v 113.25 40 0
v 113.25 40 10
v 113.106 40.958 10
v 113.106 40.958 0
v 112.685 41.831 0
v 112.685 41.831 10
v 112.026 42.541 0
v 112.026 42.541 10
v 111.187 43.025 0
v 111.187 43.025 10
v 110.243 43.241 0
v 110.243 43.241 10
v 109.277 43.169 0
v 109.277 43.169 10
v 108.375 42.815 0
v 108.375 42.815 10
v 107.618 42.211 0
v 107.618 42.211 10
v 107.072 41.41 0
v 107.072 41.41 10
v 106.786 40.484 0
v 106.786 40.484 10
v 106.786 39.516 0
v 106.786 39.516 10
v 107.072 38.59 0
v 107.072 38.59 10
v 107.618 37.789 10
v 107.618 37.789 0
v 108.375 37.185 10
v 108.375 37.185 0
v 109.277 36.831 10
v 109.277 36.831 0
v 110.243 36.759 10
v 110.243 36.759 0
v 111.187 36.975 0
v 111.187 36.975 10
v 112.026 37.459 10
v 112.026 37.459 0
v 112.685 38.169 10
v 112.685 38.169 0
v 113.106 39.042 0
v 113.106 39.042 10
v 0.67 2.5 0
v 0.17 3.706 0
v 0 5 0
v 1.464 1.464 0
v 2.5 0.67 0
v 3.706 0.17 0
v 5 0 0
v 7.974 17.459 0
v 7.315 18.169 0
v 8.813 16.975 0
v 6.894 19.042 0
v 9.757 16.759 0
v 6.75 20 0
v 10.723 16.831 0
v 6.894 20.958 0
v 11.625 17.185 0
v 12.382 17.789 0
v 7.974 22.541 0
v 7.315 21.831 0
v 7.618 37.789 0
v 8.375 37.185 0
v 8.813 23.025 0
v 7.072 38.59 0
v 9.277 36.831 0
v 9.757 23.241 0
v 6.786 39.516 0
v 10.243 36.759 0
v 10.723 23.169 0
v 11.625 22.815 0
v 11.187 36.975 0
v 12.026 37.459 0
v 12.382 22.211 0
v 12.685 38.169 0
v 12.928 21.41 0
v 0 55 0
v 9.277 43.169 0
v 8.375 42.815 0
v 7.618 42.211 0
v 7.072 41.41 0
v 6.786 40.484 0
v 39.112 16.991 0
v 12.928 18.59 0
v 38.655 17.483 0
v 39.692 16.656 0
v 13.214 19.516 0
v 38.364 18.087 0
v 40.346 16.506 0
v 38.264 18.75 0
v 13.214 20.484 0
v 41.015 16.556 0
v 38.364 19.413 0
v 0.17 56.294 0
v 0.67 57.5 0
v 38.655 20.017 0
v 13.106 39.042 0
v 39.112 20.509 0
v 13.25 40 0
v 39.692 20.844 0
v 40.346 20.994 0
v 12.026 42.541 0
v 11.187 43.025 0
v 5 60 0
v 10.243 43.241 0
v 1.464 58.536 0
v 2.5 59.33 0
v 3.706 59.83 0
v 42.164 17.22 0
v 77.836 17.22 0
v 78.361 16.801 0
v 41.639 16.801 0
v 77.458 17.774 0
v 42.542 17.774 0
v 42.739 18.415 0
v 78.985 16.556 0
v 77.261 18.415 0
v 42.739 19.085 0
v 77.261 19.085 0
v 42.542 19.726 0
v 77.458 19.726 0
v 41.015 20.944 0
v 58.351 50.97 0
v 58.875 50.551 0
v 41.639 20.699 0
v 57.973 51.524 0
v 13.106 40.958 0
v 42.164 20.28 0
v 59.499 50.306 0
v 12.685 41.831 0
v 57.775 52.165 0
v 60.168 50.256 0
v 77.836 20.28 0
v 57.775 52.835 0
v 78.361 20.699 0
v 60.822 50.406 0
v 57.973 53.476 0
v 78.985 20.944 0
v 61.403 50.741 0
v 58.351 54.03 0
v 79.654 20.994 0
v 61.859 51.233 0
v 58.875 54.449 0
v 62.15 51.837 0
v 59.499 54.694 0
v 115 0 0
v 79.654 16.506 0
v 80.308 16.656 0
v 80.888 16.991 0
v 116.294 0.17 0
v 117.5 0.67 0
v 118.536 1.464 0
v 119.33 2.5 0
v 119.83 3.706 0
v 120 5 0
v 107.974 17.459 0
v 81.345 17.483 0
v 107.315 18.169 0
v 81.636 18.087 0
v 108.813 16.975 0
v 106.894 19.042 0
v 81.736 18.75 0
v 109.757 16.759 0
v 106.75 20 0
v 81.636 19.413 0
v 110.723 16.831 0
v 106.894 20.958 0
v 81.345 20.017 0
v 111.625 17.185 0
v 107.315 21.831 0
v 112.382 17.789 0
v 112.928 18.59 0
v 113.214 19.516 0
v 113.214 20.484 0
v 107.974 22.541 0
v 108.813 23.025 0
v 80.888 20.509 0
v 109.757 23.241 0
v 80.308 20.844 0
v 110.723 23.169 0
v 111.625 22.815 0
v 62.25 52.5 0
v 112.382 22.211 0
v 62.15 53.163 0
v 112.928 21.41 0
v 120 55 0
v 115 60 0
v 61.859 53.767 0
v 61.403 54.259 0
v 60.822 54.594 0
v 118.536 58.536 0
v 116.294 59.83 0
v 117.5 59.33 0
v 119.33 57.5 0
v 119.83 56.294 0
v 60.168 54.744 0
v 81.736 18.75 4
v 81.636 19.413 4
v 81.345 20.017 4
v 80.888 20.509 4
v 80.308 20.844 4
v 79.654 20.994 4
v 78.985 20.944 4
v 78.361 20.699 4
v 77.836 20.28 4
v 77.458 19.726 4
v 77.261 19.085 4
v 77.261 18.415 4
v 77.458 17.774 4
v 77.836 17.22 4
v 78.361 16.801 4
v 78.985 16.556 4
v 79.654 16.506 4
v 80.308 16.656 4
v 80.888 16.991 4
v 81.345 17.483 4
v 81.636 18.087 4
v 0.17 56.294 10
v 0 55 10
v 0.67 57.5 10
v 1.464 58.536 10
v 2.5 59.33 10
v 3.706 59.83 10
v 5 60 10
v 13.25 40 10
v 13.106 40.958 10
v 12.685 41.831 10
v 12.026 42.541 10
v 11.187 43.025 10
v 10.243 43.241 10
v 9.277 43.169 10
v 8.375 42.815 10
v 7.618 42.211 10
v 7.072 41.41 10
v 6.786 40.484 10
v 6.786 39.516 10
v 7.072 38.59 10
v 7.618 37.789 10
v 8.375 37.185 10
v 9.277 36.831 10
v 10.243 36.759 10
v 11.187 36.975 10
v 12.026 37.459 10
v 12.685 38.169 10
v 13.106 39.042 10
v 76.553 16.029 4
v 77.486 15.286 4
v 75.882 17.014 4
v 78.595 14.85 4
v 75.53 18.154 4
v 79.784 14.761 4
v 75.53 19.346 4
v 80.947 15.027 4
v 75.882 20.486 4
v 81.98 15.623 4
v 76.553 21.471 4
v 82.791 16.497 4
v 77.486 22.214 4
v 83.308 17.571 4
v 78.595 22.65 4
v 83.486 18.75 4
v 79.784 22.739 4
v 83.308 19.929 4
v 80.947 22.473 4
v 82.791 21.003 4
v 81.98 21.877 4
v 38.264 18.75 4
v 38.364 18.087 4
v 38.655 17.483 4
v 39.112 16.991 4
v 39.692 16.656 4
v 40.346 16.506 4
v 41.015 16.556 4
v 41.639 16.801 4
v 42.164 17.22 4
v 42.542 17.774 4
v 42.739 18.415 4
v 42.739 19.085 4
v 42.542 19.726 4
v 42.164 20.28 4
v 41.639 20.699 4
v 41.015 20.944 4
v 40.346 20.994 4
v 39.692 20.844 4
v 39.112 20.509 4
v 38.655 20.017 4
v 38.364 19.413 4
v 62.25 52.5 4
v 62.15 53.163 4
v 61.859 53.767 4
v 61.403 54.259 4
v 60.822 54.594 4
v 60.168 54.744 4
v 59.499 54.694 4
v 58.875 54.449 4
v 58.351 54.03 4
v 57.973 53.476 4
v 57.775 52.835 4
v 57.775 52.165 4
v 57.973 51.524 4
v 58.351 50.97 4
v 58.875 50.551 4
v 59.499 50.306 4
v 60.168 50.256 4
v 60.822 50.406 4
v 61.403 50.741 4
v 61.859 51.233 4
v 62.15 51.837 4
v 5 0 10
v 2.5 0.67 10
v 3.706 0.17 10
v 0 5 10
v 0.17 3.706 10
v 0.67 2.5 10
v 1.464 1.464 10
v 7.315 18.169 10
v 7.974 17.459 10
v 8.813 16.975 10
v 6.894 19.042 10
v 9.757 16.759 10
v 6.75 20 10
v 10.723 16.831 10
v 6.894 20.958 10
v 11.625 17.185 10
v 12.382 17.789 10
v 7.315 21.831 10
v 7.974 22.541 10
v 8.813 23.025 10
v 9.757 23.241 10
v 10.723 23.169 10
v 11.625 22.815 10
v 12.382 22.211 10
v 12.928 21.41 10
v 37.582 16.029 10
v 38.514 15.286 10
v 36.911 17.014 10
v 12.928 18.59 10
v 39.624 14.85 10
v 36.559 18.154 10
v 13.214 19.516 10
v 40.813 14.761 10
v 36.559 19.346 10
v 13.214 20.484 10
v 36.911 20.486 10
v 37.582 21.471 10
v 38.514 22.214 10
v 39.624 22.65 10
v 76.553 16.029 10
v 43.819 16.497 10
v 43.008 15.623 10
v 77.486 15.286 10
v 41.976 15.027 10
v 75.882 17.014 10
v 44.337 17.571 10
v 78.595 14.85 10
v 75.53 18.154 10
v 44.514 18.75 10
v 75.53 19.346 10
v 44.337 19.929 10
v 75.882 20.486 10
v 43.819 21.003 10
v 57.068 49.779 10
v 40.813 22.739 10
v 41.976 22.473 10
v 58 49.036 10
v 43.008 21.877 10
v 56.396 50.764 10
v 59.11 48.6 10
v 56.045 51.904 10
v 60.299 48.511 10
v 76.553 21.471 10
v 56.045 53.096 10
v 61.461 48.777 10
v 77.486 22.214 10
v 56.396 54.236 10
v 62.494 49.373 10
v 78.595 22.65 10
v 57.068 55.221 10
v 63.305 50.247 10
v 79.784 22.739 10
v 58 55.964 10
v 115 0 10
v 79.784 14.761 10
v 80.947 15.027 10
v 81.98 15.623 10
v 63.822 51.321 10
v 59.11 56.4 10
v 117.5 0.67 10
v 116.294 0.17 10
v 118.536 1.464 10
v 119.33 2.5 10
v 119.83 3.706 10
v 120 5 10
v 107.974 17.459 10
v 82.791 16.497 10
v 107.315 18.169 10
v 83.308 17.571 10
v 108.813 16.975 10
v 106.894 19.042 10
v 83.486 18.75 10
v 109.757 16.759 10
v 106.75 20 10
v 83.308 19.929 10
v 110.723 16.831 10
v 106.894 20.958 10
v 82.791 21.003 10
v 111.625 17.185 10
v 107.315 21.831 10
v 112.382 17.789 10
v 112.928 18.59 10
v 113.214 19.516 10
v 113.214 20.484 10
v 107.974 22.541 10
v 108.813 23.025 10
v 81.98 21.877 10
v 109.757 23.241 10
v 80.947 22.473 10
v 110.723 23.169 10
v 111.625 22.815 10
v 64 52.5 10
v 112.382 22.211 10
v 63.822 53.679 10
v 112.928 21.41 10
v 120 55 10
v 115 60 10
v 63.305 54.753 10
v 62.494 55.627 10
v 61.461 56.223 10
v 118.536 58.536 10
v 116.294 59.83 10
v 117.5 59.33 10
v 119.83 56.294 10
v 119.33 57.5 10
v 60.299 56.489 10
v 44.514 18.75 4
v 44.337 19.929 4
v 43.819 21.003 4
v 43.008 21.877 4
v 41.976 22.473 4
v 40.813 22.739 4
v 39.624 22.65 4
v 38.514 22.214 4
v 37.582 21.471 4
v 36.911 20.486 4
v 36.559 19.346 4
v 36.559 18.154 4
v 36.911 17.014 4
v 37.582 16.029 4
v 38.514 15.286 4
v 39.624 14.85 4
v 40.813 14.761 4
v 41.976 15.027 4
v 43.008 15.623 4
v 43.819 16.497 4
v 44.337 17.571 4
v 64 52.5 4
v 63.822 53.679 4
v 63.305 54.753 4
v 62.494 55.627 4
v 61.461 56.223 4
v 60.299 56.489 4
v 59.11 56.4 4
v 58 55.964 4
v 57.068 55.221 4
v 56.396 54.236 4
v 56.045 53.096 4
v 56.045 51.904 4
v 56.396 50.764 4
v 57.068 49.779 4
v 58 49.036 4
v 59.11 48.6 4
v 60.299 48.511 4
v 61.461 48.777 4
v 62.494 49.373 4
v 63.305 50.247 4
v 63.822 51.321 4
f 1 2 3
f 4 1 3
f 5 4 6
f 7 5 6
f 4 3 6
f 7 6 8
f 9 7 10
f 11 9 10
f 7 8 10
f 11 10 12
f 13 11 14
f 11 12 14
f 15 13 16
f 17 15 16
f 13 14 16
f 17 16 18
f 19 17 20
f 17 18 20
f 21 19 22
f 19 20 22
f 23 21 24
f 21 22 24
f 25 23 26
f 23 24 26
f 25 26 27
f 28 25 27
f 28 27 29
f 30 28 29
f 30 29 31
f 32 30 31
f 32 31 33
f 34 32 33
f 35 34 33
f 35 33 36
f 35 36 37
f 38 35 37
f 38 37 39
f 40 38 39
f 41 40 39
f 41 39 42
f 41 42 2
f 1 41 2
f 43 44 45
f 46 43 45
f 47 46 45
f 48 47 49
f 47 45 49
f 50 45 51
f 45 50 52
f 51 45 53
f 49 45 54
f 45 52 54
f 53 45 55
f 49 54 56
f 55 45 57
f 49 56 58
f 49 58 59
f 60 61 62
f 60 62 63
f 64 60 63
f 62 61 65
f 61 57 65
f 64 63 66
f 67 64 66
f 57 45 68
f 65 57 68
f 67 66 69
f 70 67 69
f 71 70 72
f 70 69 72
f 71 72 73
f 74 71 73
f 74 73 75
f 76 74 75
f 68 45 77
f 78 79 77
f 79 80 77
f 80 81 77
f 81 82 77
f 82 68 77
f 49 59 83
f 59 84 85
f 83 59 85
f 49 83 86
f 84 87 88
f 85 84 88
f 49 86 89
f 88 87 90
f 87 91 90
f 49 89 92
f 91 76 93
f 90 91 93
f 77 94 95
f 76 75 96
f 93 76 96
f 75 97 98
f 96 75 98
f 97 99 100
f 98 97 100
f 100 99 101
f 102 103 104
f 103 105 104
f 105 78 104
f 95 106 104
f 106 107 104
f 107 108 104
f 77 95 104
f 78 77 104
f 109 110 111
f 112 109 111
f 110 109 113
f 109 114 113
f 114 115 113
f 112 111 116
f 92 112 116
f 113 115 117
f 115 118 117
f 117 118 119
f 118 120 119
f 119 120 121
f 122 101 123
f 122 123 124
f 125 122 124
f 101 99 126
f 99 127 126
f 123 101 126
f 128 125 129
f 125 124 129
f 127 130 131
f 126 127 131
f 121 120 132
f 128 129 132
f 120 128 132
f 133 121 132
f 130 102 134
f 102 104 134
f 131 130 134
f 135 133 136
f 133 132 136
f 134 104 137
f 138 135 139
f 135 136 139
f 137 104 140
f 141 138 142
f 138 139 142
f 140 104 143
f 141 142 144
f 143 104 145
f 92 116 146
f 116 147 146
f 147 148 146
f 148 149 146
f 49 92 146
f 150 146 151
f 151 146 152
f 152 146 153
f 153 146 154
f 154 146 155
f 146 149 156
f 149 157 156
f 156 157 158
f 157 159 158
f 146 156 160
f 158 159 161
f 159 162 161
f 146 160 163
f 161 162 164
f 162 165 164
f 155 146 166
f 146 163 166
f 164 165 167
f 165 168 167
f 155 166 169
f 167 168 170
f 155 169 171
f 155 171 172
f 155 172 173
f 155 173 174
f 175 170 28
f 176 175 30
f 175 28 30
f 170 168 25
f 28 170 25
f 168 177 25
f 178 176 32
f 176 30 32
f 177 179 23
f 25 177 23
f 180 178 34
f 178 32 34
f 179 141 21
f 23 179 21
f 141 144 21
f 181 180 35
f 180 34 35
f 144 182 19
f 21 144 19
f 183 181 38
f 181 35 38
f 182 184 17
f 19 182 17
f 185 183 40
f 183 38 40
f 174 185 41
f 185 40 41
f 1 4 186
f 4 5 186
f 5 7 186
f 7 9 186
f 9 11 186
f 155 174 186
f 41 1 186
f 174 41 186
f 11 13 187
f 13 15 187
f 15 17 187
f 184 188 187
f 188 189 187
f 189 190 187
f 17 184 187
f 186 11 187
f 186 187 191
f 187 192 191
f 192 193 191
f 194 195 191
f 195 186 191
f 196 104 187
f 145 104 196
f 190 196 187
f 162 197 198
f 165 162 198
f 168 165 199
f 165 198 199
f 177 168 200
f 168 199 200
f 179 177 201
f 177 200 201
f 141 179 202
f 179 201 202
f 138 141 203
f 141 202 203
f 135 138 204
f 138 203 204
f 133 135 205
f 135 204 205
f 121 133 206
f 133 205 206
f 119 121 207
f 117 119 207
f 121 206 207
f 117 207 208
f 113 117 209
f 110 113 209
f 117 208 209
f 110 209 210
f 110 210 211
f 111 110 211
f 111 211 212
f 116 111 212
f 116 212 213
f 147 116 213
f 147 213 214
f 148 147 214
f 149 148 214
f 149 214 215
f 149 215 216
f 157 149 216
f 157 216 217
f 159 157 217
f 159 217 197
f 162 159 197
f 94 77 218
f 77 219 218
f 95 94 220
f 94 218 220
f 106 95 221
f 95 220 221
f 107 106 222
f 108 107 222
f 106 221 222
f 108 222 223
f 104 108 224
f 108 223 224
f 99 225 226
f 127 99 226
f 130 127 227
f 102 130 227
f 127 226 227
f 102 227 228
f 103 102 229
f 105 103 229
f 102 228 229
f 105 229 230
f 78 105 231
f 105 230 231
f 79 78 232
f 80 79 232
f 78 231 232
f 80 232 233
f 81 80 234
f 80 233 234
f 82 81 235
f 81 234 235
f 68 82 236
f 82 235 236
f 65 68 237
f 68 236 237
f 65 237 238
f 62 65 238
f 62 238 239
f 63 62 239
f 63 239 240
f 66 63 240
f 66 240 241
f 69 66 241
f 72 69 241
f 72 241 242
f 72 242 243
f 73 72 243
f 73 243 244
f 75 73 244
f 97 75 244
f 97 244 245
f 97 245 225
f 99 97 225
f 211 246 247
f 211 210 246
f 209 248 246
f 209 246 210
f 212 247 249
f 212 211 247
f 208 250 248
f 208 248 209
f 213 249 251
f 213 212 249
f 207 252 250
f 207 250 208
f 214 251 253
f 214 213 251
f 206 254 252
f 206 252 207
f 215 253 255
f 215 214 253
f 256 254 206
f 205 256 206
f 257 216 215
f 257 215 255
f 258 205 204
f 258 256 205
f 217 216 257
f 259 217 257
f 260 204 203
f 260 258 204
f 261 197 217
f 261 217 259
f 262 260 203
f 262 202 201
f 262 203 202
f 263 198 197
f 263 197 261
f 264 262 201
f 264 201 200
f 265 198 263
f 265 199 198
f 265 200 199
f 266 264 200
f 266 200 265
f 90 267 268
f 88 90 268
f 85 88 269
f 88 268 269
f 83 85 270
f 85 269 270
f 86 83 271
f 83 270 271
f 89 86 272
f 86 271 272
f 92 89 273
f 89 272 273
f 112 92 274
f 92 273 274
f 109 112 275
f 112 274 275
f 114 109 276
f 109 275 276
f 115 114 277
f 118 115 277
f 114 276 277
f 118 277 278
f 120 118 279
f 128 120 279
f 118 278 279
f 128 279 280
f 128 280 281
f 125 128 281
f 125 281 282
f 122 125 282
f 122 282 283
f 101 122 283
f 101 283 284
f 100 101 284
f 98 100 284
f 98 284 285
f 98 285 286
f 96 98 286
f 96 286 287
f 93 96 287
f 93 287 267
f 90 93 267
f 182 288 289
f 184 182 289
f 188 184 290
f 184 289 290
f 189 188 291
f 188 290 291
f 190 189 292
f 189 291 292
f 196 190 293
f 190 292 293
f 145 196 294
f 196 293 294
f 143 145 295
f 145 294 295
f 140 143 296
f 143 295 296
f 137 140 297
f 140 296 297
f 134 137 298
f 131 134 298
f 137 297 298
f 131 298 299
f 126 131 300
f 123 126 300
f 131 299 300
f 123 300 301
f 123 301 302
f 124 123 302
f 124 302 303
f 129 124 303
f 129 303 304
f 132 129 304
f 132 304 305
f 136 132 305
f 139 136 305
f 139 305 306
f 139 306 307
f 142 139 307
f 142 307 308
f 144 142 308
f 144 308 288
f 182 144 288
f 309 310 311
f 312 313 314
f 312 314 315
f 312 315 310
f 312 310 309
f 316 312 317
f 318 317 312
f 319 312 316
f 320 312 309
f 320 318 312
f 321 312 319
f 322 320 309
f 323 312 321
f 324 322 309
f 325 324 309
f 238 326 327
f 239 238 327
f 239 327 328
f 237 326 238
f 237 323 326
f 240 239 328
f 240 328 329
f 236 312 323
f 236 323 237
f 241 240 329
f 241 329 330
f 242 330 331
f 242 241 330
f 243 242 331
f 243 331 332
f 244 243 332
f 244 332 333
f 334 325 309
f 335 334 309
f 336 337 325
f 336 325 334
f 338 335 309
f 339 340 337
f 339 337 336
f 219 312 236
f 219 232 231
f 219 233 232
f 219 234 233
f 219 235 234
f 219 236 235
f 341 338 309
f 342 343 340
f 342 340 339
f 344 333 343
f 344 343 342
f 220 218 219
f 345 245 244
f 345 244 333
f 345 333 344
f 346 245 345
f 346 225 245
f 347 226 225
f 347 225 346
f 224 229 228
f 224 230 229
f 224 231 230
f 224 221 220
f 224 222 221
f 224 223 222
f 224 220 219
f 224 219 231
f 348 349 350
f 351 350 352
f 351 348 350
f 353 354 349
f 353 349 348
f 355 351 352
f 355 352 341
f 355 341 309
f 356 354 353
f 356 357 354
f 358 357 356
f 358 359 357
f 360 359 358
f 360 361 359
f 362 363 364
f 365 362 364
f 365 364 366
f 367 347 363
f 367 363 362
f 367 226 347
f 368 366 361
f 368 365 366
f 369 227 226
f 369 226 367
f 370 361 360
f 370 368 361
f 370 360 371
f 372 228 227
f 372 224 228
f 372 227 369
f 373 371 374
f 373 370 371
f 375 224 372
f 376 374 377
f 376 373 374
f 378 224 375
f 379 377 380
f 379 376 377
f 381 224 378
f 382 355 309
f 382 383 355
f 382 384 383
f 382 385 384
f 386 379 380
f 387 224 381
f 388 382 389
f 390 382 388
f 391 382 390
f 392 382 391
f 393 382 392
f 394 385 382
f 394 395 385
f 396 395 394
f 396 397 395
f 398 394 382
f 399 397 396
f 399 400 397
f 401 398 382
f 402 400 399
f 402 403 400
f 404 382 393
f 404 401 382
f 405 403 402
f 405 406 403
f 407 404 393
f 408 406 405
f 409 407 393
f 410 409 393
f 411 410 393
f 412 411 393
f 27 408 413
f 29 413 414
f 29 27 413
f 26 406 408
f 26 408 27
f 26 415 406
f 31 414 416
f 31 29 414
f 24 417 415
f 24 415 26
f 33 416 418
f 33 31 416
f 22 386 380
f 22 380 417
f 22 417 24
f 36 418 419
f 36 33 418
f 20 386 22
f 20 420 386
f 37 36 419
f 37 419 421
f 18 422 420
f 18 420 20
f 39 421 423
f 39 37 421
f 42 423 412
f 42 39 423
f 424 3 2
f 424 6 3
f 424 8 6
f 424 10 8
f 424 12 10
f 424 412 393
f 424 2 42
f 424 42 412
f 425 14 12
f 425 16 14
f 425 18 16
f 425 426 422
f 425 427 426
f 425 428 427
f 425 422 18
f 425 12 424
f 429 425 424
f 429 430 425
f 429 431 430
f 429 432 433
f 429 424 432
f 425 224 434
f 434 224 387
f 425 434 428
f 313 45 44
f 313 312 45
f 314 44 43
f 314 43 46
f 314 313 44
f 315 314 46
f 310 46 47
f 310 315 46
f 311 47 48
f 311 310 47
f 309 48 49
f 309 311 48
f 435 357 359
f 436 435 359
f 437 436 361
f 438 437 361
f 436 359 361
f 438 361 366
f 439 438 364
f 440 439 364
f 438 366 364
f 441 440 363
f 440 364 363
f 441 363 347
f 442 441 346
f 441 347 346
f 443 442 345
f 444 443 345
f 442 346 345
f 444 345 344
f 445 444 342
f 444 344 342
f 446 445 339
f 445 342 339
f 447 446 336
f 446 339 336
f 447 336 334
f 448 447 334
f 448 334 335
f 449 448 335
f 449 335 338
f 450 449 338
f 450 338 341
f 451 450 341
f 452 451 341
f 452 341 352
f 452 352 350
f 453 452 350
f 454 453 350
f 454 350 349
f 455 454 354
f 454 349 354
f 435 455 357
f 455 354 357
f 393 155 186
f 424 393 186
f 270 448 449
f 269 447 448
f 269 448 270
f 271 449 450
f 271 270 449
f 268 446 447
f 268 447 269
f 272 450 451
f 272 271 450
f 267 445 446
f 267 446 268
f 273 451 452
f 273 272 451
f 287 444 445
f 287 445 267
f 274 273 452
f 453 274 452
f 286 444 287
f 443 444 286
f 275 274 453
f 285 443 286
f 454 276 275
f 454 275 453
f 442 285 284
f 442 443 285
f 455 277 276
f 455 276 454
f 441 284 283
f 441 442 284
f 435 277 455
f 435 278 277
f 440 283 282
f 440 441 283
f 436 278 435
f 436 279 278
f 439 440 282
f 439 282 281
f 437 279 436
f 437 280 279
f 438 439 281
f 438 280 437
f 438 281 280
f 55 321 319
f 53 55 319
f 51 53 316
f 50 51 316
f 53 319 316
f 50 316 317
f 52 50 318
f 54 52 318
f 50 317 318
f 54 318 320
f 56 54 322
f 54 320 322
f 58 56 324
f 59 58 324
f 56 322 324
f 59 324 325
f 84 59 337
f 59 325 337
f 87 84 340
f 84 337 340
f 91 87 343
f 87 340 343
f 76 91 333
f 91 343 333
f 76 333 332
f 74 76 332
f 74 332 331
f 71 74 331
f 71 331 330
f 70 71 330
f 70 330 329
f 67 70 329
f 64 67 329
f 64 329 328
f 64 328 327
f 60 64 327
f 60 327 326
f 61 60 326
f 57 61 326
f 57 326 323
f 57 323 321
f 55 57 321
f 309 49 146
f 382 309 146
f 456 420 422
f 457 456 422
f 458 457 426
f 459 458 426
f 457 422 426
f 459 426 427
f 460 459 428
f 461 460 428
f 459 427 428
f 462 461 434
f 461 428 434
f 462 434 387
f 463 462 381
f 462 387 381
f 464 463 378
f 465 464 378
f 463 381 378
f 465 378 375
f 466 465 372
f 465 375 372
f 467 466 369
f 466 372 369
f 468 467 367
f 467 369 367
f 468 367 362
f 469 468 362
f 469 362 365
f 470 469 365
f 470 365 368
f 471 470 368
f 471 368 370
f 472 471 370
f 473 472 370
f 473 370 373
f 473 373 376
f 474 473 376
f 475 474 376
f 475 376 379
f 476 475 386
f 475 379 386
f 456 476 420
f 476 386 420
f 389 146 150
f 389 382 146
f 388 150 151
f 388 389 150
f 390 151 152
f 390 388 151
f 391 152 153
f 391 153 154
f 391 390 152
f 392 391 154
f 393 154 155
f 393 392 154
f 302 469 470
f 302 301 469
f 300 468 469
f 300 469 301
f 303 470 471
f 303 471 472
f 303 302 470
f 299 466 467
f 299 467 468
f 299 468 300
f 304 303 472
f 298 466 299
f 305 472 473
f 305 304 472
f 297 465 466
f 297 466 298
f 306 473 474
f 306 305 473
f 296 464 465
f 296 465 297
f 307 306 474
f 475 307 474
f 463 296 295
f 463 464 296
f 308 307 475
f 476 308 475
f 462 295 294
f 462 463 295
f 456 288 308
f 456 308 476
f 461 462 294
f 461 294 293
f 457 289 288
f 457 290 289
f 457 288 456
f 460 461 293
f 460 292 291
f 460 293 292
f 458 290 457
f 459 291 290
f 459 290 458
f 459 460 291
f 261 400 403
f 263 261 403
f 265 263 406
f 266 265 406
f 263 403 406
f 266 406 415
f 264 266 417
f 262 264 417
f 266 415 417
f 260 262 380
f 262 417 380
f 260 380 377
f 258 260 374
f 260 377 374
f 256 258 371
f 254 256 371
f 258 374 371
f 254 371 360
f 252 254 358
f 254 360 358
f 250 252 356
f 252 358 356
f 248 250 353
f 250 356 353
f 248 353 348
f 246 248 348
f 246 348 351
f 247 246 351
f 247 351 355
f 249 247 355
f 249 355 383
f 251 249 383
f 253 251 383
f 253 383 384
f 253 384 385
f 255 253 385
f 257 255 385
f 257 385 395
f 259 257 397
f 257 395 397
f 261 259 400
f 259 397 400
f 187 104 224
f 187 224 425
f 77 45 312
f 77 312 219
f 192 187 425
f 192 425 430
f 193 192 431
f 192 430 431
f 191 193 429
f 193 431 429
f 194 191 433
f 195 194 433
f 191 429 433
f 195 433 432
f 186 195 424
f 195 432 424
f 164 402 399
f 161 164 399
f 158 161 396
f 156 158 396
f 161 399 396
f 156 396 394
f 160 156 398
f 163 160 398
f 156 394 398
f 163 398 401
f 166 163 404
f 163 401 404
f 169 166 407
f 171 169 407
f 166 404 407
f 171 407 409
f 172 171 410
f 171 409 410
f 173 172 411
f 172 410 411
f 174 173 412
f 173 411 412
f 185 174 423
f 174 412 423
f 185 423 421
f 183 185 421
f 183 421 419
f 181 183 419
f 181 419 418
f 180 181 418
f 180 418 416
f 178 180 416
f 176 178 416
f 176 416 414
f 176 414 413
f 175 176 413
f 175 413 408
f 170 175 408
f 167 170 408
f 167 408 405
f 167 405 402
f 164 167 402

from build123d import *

# Parameters (mm, degrees)
SKETCH_1_W          = 120
SKETCH_1_H          = 60
EXTRUDE_1_DEPTH     = 10
SKETCH_2_R          = 3.25
CUT_EXTRUDE_1_DEPTH = 135.536240471
SKETCH_3_R          = 2.25
CUT_EXTRUDE_2_DEPTH = 135.536240471
SKETCH_4_R          = 4
CUT_EXTRUDE_3_DEPTH = 6
FILLET_1_R          = 5


with BuildPart() as part:
    # ｽｹｯﾁ1 → ﾎﾞｽ - 押し出し1 (new body)
    with BuildSketch(Plane.XY):
        with Locations((60, 30)):
            Rectangle(SKETCH_1_W, SKETCH_1_H)
    extrude(amount=EXTRUDE_1_DEPTH)

    # ｽｹｯﾁ2 → ｶｯﾄ - 押し出し1 (cut, through all)
    with BuildSketch(Plane.XY.offset(10)):
        with Locations((10, 40)):
            Circle(SKETCH_2_R)
        with Locations((110, 40)):
            Circle(SKETCH_2_R)
        with Locations(Location((110, 20, 0), (0, 0, 180))):
            Circle(SKETCH_2_R)
        with Locations(Location((10, 20, 0), (0, 0, 180))):
            Circle(SKETCH_2_R)
    extrude(amount=-CUT_EXTRUDE_1_DEPTH, mode=Mode.SUBTRACT)

    # ｽｹｯﾁ3 → ｶｯﾄ - 押し出し2 (cut, through all)
    with BuildSketch(Plane.XY.offset(10)):
        with Locations((60, 52.5)):
            Circle(SKETCH_3_R)
        with Locations((79.485571585, 18.75)):
            Circle(SKETCH_3_R)
        with Locations(Location((40.514428415, 18.75, 0), (0, 0, 180))):
            Circle(SKETCH_3_R)
    extrude(amount=-CUT_EXTRUDE_2_DEPTH, mode=Mode.SUBTRACT)

    # ｽｹｯﾁ4 → ｶｯﾄ - 押し出し3 (cut)
    with BuildSketch(Plane.XY.offset(10)):
        with Locations((60, 52.5)):
            Circle(SKETCH_4_R)
        with Locations((79.485571585, 18.75)):
            Circle(SKETCH_4_R)
        with Locations((40.514428415, 18.75)):
            Circle(SKETCH_4_R)
    extrude(amount=-CUT_EXTRUDE_3_DEPTH, mode=Mode.SUBTRACT)

    # ﾌｨﾚｯﾄ1
    fillet_1_edges = [part.edges().sort_by_distance(p)[0] for p in [
        (0, 60, 5),
        (120, 60, 5),
        (120, 0, 5),
        (0, 0, 5),
    ]]
    fillet(fillet_1_edges, radius=FILLET_1_R)


solid = part.part
